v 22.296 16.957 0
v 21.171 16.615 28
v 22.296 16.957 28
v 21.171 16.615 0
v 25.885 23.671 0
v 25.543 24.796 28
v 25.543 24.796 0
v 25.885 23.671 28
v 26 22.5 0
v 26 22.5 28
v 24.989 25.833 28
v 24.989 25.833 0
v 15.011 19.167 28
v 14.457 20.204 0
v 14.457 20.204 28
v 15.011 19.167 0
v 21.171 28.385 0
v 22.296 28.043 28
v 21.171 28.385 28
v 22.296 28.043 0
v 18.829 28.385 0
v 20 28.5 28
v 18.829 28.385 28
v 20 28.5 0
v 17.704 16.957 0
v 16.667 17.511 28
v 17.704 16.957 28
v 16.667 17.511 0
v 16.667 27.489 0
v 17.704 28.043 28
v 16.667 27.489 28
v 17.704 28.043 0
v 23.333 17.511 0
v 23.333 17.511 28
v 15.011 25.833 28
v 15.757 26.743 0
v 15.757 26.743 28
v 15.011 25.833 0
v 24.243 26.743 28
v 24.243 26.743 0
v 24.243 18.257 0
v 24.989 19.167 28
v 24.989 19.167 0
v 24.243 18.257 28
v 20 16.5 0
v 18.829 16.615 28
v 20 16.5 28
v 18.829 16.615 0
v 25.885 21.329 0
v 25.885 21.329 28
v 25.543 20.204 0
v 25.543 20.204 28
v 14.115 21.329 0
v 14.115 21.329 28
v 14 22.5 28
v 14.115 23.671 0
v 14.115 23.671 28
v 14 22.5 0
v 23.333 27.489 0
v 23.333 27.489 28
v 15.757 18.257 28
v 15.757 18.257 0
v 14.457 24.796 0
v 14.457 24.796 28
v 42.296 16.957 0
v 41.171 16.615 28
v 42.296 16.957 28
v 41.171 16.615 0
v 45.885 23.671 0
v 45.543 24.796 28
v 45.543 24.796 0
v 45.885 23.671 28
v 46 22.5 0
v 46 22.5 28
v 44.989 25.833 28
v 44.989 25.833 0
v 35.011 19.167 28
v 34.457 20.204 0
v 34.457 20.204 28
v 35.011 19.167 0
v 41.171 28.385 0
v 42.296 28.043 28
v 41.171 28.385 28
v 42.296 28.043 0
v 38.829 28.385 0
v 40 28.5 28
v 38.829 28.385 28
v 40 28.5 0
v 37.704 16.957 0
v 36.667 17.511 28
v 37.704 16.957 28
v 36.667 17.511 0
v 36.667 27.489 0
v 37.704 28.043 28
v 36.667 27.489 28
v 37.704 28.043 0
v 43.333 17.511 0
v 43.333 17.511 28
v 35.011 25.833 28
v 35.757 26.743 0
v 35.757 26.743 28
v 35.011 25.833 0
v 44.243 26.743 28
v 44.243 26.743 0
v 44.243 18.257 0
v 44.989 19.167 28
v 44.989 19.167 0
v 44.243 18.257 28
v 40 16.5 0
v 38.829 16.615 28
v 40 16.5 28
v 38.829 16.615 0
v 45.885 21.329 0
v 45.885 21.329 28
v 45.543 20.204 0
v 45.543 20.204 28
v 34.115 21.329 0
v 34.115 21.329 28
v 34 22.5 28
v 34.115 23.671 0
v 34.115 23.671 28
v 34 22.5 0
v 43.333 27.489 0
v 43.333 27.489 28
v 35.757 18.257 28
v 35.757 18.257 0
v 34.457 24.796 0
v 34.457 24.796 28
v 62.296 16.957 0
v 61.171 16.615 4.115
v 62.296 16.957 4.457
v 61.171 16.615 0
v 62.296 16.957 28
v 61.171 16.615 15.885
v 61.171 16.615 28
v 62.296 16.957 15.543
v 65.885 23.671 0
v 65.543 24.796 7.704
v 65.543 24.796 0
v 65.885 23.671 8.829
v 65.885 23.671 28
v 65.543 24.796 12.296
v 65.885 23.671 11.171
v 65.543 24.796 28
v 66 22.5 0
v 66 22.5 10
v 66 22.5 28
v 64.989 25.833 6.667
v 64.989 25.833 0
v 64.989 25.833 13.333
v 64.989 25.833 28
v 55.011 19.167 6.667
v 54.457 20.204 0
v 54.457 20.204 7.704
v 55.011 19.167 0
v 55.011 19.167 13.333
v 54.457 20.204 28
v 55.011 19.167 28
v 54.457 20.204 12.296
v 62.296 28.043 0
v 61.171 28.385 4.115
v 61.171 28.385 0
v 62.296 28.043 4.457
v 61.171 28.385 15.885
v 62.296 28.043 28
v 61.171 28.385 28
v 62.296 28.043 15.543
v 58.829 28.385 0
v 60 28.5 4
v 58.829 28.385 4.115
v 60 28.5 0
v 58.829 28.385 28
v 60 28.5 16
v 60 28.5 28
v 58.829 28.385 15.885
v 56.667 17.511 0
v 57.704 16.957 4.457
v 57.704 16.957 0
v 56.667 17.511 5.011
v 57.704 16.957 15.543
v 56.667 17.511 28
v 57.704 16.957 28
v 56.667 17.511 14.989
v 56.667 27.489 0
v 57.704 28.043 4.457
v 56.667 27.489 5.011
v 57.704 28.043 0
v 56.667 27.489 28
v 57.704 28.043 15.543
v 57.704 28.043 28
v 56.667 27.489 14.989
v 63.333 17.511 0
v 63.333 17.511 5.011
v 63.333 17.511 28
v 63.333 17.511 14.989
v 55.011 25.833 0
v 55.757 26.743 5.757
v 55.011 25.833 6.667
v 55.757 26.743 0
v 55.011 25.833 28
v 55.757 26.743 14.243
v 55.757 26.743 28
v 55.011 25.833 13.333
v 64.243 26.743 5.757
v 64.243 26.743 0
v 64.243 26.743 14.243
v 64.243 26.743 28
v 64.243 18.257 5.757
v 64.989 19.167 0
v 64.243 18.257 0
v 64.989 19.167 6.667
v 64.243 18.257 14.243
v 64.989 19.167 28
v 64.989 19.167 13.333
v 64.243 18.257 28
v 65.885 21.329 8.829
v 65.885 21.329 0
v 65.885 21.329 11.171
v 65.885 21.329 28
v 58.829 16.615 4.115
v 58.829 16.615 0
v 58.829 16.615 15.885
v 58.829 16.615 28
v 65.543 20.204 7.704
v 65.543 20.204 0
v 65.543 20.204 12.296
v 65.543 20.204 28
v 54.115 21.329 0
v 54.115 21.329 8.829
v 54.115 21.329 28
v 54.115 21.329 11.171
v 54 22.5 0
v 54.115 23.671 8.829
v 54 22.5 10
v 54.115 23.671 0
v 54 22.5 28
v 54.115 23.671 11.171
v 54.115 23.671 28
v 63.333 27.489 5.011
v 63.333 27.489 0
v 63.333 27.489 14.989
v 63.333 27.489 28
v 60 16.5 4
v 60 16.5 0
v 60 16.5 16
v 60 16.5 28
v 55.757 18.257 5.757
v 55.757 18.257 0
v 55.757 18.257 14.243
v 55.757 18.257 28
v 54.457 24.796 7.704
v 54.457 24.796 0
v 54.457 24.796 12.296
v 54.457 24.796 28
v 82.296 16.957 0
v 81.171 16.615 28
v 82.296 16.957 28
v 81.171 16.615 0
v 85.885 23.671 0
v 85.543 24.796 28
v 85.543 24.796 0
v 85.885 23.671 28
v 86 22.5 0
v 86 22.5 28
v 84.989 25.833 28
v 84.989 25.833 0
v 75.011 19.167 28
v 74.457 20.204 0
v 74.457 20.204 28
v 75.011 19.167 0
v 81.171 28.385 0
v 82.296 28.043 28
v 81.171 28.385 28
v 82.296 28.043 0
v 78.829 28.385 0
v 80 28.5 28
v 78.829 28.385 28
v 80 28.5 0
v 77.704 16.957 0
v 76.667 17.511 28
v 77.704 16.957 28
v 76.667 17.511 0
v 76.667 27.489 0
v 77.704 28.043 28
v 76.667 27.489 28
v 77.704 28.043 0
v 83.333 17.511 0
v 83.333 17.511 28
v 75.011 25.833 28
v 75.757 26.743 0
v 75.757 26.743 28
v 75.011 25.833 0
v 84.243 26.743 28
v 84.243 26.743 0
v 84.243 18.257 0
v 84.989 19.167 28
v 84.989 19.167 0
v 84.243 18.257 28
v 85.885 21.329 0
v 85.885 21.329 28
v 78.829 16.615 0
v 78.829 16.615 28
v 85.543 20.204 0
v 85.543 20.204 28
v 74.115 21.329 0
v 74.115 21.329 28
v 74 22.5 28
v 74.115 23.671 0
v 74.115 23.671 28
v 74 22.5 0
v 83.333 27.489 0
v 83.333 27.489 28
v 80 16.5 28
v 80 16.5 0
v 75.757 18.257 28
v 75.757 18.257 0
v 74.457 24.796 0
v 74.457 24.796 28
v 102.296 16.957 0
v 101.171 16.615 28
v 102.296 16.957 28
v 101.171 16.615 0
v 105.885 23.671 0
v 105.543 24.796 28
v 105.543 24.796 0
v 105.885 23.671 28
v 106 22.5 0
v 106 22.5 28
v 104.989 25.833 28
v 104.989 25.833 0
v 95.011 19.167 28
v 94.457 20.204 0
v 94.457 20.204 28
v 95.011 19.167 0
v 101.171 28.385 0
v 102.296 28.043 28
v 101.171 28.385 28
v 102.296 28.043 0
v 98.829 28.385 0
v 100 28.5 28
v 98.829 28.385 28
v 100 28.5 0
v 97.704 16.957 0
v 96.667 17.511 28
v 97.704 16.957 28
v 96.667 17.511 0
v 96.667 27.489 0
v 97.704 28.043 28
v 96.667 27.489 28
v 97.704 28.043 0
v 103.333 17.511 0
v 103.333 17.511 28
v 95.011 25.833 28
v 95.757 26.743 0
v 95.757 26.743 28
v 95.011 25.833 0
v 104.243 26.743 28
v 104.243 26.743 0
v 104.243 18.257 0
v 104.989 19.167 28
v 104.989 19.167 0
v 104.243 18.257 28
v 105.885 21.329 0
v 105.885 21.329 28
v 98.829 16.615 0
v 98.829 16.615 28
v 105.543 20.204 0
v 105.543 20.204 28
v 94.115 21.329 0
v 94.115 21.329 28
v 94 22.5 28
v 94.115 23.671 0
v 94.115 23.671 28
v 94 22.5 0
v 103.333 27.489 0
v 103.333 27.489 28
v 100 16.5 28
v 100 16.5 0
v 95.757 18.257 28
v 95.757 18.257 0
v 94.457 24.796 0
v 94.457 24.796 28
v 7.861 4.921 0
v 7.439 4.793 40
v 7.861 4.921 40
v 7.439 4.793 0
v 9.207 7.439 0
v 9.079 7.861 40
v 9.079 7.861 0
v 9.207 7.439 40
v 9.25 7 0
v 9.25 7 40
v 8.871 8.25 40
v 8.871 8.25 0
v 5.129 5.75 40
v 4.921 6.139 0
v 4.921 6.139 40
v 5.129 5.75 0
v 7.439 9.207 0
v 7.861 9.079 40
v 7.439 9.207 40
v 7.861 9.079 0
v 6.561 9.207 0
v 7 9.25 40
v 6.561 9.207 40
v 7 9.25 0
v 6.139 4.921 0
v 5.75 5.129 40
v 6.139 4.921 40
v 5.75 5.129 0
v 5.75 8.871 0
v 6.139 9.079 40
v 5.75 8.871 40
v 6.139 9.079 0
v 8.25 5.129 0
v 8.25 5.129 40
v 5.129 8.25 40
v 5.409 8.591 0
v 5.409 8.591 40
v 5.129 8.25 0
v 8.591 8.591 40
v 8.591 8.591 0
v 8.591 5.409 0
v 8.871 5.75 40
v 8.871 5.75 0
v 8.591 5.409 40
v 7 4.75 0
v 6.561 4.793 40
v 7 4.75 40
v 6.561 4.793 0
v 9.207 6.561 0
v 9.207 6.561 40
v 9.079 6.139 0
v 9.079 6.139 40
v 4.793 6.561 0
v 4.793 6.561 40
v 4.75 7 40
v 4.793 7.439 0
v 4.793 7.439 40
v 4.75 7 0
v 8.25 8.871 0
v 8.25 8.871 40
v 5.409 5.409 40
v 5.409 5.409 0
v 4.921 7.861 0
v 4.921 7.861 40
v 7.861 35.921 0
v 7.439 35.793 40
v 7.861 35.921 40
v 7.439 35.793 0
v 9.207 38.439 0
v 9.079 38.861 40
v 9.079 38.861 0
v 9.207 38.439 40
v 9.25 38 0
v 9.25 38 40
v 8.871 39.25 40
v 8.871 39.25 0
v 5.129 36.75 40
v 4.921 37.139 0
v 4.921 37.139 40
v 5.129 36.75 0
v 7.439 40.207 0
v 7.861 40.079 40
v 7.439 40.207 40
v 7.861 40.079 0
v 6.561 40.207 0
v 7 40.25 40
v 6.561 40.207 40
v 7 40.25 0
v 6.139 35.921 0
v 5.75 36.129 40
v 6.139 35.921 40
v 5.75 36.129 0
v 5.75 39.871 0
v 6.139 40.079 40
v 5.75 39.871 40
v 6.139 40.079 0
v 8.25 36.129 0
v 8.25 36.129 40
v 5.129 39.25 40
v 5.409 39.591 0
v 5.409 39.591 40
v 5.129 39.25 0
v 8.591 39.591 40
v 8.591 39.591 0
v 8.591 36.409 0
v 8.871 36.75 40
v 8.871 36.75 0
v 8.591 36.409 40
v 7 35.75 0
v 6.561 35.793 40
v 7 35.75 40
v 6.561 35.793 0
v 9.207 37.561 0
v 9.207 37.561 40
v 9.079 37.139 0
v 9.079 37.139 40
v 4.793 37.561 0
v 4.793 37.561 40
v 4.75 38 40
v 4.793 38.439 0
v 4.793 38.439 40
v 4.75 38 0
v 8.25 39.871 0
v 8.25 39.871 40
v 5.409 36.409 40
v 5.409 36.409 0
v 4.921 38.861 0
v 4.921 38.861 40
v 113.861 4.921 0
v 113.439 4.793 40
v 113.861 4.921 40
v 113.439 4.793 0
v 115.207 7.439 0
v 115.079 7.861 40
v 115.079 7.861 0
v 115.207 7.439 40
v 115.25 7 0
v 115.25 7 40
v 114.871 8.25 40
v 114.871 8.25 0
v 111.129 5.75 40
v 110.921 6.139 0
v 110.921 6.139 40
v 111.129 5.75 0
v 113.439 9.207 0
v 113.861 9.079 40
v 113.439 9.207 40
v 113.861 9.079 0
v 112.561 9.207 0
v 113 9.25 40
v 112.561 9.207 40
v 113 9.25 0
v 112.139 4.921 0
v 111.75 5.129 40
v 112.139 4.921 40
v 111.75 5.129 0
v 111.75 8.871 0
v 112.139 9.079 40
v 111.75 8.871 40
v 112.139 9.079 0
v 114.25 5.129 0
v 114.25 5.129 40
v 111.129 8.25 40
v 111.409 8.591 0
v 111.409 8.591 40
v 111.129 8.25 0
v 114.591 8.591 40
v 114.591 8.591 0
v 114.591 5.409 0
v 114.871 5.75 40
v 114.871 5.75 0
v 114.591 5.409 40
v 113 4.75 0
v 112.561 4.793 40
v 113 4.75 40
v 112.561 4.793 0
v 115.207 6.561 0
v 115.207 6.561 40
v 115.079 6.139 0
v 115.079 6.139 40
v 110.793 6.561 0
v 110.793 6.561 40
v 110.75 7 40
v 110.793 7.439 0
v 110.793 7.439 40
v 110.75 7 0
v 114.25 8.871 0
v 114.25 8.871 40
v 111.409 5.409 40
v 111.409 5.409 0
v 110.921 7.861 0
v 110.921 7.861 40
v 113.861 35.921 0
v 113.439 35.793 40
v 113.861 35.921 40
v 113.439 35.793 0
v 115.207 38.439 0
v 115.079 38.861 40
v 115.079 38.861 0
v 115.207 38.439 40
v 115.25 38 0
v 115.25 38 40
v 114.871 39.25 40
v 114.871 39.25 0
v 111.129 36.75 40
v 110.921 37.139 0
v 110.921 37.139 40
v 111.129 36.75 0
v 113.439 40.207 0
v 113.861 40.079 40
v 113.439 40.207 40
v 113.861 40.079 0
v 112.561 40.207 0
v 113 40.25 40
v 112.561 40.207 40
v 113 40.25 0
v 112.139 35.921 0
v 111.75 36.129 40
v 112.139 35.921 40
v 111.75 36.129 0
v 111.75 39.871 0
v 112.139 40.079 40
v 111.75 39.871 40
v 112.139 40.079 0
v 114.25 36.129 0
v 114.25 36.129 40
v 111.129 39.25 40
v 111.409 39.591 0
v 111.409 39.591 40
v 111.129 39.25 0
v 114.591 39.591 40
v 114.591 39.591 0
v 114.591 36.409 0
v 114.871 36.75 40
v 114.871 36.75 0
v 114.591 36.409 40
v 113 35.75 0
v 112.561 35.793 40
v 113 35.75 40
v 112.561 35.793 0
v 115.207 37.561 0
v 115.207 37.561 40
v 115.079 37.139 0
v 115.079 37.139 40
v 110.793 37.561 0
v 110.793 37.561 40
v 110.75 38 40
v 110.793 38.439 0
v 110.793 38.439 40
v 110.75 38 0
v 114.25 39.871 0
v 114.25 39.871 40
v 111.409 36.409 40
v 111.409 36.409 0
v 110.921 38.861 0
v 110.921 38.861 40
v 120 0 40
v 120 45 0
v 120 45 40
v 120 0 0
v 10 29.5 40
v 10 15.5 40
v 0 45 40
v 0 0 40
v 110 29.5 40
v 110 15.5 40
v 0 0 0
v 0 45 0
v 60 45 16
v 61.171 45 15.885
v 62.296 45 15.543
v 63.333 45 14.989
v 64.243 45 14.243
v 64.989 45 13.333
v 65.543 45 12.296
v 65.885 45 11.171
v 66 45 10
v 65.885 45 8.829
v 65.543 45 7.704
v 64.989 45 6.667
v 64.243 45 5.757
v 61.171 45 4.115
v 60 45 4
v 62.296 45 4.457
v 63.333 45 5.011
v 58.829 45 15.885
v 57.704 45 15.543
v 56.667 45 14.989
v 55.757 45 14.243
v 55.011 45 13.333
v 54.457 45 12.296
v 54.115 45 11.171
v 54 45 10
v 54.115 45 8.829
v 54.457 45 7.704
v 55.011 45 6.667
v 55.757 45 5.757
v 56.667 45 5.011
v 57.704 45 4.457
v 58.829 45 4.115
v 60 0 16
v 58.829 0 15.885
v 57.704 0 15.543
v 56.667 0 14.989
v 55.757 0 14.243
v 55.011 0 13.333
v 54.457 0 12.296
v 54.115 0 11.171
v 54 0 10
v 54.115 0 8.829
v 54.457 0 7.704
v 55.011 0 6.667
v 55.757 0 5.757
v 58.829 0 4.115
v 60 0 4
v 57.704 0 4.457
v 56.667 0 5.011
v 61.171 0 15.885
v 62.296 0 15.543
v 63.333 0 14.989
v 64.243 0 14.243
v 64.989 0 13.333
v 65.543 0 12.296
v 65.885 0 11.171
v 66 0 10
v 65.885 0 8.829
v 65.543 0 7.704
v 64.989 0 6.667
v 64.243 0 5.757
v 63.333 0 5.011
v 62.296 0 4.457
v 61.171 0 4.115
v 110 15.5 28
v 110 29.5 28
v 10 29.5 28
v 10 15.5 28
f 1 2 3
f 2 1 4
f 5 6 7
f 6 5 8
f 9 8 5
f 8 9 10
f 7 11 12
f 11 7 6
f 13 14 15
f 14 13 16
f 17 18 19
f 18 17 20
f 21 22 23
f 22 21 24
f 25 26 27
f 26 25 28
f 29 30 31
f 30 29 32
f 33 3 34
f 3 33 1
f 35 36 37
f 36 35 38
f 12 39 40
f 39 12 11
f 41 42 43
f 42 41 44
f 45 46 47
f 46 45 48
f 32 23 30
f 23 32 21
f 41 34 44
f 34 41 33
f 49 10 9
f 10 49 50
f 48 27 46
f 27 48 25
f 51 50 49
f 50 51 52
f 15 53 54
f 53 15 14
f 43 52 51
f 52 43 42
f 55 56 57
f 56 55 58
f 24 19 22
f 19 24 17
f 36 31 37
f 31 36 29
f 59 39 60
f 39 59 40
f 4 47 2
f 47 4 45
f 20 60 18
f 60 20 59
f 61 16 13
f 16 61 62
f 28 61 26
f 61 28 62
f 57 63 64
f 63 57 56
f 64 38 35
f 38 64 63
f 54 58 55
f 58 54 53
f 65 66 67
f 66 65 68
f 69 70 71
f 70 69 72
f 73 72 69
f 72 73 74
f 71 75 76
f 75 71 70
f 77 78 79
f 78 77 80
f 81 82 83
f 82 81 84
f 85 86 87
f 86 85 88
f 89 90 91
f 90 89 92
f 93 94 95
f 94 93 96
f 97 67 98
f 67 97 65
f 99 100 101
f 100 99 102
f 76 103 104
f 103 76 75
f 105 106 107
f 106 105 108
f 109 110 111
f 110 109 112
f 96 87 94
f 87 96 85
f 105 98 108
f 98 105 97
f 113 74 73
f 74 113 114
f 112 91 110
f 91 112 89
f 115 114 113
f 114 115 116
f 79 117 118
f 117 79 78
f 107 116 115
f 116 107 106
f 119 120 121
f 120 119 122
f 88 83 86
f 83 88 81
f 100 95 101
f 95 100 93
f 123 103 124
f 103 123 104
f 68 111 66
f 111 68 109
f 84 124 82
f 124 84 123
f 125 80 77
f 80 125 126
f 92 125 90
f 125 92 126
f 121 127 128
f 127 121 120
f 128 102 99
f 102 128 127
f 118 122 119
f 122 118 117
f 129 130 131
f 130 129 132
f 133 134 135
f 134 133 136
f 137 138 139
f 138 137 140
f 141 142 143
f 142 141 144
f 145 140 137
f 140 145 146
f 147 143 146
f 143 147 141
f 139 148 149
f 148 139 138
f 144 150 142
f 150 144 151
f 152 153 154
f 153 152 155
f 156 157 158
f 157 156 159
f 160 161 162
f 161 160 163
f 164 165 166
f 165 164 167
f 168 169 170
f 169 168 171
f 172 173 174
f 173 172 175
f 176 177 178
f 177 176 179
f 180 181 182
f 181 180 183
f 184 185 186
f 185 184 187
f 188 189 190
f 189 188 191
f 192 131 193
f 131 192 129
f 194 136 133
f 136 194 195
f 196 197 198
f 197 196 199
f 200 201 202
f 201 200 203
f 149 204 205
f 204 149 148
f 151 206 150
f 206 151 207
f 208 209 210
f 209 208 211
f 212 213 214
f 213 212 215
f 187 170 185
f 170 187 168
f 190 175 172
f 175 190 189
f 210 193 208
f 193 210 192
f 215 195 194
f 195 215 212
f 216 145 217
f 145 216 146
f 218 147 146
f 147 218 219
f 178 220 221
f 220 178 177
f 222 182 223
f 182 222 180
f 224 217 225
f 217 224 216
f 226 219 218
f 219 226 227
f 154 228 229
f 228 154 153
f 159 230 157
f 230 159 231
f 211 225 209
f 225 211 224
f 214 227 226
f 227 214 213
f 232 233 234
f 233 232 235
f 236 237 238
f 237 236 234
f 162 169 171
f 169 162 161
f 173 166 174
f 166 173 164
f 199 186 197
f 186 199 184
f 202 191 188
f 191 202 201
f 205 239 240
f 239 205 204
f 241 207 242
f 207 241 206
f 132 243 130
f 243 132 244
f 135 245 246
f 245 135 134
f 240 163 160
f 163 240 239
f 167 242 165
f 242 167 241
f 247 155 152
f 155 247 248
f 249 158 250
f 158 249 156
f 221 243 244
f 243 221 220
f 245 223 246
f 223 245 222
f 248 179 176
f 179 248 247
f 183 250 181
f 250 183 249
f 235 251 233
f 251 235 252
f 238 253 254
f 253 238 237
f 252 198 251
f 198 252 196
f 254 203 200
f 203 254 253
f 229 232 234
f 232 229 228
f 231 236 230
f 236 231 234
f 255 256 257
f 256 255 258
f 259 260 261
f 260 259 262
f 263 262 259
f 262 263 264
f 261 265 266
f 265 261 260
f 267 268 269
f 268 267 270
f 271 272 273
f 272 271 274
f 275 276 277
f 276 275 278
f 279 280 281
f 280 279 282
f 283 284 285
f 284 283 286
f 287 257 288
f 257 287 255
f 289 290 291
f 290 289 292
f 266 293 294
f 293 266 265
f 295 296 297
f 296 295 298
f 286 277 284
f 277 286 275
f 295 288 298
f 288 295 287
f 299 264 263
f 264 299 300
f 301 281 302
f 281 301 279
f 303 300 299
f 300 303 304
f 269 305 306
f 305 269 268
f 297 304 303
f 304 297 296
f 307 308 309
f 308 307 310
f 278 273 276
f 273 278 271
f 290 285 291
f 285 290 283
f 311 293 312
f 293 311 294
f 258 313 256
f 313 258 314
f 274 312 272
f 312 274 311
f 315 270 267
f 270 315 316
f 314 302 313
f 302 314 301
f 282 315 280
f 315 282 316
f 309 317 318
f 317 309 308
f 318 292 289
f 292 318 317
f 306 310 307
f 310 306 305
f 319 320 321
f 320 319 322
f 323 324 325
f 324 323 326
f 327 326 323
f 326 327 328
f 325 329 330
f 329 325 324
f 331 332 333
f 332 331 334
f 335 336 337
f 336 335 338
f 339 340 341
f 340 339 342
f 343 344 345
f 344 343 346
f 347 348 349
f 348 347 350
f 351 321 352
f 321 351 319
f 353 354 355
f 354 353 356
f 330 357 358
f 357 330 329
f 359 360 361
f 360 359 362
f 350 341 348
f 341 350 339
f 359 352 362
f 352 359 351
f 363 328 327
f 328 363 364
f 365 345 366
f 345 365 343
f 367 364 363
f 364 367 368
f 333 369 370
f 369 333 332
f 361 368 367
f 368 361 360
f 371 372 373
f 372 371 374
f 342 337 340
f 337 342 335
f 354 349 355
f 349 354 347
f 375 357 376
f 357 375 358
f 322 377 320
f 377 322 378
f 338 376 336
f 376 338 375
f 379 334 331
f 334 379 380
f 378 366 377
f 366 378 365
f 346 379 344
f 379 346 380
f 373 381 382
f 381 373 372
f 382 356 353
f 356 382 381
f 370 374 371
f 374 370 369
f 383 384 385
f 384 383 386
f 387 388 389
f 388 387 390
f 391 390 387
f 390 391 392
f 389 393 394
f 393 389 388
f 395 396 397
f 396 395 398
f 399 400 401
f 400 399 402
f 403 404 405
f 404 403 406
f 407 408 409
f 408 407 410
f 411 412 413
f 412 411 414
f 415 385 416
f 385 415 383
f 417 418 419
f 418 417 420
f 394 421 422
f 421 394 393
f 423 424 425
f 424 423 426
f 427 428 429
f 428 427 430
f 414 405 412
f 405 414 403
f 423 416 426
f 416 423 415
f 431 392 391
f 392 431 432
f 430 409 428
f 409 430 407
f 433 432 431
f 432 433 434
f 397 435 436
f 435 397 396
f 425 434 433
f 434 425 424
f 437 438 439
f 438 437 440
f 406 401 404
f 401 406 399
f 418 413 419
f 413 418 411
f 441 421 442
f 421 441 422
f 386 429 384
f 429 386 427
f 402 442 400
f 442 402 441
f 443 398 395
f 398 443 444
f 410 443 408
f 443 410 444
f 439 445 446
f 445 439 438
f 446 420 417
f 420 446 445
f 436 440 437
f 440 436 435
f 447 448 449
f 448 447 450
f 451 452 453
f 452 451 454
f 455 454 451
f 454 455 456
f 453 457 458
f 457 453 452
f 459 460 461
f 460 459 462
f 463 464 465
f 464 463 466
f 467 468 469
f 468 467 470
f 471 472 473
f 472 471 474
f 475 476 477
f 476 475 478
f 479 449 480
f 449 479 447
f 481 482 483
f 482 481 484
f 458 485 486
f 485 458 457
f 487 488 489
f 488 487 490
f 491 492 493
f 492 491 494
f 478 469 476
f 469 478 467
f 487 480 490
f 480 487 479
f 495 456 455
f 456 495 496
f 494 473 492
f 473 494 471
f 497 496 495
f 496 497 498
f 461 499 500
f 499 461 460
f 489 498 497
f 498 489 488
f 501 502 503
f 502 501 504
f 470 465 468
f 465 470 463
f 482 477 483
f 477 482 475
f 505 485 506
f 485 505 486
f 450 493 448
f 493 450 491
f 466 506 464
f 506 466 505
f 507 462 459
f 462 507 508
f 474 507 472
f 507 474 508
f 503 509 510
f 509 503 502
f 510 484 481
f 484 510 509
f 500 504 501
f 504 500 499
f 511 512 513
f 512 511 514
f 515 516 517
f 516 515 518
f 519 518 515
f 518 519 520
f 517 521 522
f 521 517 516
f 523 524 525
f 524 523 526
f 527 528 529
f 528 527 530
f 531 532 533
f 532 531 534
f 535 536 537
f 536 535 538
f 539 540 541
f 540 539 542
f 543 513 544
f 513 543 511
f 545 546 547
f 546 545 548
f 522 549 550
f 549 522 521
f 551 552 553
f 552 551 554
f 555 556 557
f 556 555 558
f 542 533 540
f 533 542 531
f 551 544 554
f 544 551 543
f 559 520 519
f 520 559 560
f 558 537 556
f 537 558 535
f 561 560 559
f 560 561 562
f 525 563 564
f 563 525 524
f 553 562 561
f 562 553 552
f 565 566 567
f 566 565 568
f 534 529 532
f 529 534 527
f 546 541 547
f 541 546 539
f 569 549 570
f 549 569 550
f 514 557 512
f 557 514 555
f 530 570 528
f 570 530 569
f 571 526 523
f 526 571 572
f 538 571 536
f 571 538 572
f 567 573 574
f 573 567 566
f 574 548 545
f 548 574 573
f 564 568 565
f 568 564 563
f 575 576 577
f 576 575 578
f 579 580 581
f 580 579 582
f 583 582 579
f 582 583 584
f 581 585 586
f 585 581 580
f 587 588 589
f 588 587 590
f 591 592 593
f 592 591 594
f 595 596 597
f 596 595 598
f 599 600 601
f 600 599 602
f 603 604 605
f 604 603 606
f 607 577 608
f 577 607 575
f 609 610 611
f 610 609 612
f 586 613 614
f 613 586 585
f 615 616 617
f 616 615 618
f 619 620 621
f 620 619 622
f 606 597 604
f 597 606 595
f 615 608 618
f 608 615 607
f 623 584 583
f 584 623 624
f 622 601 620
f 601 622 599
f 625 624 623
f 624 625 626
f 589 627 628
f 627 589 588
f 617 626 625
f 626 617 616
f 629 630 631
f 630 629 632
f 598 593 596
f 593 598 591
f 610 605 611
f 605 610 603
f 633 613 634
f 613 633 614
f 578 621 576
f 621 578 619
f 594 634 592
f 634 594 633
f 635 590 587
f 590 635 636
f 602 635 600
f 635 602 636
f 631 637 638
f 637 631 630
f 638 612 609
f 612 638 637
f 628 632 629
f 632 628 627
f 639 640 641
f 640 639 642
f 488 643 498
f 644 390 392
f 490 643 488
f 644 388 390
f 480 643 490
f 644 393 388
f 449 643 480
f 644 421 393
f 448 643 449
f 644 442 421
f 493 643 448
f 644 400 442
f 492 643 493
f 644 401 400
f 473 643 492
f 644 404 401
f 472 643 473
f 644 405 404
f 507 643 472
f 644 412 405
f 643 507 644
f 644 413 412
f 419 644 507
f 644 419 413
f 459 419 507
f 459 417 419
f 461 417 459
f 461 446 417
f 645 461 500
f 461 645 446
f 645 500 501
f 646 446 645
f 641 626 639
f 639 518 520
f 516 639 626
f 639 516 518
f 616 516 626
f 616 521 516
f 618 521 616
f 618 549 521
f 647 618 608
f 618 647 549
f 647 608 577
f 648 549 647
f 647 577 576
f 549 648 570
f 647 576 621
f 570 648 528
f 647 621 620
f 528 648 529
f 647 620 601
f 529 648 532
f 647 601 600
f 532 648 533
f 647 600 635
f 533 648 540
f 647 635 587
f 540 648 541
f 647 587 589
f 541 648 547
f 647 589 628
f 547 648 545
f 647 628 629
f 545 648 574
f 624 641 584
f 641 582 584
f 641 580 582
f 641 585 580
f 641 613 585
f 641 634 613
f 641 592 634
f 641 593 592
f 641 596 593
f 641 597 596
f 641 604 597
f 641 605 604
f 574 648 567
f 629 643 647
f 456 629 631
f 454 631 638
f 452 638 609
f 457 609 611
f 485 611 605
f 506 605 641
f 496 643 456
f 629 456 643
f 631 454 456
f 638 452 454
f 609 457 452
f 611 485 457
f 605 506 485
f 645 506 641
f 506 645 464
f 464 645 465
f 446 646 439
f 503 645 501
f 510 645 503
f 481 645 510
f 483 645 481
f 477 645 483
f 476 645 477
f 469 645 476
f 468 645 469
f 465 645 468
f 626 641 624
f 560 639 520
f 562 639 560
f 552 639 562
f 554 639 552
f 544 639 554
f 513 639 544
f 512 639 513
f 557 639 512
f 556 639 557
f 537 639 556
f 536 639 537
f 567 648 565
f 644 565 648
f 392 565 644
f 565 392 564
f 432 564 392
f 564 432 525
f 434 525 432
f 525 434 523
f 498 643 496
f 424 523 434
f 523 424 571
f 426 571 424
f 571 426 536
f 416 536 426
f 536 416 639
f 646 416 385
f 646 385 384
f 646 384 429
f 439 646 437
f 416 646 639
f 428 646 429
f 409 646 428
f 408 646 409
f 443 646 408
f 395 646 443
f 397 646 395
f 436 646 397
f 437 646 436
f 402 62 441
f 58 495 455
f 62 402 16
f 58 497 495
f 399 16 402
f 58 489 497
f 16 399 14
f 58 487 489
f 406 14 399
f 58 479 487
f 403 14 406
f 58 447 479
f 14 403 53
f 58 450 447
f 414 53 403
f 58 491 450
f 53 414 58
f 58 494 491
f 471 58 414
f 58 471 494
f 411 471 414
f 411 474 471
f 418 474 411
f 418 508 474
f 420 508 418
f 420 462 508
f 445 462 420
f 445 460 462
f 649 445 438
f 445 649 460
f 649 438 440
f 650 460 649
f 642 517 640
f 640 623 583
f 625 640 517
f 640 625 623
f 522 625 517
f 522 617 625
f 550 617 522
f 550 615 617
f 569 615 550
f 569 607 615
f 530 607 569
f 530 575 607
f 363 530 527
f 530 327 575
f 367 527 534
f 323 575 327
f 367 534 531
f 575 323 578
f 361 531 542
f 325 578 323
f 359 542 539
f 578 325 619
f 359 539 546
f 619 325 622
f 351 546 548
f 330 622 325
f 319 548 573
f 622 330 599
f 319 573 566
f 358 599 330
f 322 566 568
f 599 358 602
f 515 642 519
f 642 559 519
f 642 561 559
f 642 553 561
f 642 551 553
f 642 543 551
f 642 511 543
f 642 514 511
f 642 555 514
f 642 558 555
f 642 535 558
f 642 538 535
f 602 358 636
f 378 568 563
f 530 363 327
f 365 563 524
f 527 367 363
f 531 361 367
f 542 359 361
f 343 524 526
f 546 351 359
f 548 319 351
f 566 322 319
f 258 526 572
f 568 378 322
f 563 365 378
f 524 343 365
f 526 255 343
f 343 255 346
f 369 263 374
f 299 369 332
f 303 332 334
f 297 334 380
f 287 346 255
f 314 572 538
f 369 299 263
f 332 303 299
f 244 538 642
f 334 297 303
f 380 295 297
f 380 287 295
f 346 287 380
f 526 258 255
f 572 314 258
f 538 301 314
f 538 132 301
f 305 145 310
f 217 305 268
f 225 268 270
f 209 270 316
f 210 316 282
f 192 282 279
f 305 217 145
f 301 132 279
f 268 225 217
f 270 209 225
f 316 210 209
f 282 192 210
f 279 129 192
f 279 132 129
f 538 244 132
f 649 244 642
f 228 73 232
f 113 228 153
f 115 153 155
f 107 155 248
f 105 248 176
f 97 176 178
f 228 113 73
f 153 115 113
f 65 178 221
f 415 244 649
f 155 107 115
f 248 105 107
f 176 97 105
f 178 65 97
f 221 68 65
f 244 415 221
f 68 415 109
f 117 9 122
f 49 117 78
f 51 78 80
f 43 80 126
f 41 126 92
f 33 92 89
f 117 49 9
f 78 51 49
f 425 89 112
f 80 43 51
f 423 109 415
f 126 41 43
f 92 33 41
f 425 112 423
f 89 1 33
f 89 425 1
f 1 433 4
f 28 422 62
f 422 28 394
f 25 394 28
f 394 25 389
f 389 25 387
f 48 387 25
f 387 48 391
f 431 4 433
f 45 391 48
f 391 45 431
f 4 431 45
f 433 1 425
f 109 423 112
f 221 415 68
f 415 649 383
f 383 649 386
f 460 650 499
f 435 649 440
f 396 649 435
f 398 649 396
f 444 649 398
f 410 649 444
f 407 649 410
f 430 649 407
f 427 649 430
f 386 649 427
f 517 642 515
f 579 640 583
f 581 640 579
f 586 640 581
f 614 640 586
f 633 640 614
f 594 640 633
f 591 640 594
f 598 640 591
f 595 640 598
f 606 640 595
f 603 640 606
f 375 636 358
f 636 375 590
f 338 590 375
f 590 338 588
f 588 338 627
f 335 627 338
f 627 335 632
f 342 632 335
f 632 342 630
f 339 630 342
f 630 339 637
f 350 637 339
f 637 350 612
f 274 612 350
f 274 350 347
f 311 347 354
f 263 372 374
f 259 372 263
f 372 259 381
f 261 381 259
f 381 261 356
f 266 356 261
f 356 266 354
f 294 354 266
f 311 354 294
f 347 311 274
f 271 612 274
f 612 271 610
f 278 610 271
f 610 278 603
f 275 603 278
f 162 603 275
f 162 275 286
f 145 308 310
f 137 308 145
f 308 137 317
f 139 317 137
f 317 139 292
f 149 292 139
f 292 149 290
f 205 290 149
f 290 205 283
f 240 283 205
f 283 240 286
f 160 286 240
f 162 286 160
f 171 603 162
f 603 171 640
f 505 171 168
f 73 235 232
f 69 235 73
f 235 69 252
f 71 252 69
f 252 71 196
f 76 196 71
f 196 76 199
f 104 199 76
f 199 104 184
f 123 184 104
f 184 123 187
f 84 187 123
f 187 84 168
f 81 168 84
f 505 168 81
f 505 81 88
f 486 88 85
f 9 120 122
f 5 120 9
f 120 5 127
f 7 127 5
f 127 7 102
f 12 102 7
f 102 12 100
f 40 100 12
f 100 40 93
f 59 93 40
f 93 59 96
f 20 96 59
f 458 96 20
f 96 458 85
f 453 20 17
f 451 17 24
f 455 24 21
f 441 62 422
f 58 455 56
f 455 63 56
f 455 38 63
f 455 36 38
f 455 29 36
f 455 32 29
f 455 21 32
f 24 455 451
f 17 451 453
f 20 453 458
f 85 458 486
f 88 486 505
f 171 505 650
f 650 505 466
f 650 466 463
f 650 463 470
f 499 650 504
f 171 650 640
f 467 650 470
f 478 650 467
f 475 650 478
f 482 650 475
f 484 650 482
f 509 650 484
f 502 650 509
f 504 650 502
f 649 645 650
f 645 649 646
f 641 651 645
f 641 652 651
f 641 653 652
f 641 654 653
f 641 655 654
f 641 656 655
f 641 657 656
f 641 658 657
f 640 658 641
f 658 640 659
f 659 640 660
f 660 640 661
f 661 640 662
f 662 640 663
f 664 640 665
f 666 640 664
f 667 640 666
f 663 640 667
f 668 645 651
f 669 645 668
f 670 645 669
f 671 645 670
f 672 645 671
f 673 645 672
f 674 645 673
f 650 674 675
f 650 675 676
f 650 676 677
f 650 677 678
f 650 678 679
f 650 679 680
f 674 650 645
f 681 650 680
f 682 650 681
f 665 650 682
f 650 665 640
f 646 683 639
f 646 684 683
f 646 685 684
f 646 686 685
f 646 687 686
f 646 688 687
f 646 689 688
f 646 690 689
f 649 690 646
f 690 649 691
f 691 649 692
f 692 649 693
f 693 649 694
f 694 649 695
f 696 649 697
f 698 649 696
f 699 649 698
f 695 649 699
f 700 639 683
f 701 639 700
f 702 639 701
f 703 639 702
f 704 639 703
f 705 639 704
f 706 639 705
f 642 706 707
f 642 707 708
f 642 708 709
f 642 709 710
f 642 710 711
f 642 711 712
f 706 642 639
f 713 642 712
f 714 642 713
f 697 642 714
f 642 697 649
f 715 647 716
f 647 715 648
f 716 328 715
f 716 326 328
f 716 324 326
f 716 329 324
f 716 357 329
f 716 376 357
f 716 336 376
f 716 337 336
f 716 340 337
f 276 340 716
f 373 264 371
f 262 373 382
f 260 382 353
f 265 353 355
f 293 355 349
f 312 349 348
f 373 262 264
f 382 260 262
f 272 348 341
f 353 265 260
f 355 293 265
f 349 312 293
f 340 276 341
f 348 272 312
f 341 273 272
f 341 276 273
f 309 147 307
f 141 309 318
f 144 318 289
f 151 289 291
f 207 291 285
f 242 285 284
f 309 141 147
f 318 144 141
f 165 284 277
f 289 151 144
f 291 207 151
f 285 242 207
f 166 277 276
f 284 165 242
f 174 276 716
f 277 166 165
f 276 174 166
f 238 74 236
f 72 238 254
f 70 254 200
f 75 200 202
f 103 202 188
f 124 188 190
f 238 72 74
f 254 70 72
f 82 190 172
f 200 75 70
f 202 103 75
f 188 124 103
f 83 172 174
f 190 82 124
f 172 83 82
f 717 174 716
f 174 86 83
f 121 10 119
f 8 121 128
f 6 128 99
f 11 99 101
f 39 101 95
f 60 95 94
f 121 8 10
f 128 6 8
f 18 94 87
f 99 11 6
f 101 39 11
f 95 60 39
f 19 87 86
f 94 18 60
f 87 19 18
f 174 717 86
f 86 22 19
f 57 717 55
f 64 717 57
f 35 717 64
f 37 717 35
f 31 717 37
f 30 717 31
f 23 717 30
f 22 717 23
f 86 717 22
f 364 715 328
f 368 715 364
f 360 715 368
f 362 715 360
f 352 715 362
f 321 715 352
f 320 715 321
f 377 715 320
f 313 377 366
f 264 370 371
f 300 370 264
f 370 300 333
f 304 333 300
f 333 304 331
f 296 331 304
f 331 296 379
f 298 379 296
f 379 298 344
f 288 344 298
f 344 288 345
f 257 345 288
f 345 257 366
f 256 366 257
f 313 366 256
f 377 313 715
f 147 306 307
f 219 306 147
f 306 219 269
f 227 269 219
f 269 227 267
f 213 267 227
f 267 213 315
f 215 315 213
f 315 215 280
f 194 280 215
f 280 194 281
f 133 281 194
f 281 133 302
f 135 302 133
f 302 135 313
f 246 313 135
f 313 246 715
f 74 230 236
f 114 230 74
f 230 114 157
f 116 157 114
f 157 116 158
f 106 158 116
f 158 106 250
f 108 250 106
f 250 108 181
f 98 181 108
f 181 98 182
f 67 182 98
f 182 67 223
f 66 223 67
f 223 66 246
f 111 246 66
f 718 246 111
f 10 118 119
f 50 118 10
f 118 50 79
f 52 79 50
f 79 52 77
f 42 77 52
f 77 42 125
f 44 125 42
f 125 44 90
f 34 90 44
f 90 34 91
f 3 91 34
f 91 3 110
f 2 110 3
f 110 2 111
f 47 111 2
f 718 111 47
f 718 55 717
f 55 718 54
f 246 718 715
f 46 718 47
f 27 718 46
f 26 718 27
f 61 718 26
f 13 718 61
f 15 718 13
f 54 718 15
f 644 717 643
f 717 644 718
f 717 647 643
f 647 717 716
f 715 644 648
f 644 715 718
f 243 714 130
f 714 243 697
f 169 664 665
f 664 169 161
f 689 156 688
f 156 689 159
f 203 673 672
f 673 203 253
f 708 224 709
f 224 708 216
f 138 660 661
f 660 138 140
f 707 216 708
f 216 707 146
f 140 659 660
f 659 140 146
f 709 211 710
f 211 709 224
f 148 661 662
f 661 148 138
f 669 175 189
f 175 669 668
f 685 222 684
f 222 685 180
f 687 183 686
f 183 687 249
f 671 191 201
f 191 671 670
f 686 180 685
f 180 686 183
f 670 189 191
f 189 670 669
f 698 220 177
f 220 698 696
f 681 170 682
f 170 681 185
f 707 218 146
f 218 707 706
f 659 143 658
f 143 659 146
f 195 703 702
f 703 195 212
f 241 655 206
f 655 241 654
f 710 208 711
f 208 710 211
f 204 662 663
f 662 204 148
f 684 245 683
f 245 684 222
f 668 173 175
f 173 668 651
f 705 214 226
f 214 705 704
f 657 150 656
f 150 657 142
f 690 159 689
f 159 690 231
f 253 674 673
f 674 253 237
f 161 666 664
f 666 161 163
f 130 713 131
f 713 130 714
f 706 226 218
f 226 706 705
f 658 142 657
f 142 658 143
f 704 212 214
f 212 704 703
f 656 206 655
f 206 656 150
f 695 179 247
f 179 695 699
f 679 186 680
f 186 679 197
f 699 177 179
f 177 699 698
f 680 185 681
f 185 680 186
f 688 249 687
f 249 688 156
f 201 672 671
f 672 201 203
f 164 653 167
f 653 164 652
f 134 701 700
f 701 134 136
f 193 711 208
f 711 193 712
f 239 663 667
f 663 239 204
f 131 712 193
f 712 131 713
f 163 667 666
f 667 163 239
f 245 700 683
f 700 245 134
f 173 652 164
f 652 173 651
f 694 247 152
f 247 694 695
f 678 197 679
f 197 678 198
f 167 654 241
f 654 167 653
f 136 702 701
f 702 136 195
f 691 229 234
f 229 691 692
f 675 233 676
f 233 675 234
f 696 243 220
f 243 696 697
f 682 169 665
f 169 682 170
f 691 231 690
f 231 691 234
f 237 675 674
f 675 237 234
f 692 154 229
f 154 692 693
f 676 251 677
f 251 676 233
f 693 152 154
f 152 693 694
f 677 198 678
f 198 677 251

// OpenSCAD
$fn = 32;

// ----------------------------------------------------------------------
// Manifold block: side_outlet manifold
// ----------------------------------------------------------------------

// --- parameters (mm) ---
block_l = 120;            // block length, X
block_w = 45;             // block width, Y
block_h = 40;             // block height, Z
port_d = 12;              // port bore diameter
port_pitch = 20;          // port pitch along X
gallery_d = 14;           // top gallery width, Y
gallery_depth = 12;       // gallery pocket depth
wall_p = 10;              // gallery end wall thickness, X
mnt_d = 4.5;              // mounting hole diameter
mnt_in = 7;               // mounting hole inset from the edges
out_d = 12;               // outlet bore diameter
out_z = 10;               // outlet axis height
fit_tol = 0.1;            // tolerance for press fits, mm
free_tol = 0.3;           // tolerance for clearance fits, mm

n_ports = 5;  // ports in the row
port_x0 = (block_l - (n_ports - 1) * port_pitch) / 2;  // first port X

difference() {
  cube([block_l, block_w, block_h]);
  for (i = [0 : n_ports - 1])
    translate([port_x0 + i * port_pitch, block_w / 2, -1])
      cylinder(h = block_h + 2, d = port_d);
  translate([wall_p, block_w / 2 - gallery_d / 2, block_h - gallery_depth])
    cube([block_l - 2 * wall_p, gallery_d, gallery_depth + 1]);
  for (cx = [mnt_in, block_l - mnt_in])
    for (cy = [mnt_in, block_w - mnt_in])
      translate([cx, cy, -1]) cylinder(h = block_h + 2, d = mnt_d);
  translate([block_l / 2, -1, out_z]) rotate([-90, 0, 0])
    cylinder(h = block_w + 2, d = out_d);
}
